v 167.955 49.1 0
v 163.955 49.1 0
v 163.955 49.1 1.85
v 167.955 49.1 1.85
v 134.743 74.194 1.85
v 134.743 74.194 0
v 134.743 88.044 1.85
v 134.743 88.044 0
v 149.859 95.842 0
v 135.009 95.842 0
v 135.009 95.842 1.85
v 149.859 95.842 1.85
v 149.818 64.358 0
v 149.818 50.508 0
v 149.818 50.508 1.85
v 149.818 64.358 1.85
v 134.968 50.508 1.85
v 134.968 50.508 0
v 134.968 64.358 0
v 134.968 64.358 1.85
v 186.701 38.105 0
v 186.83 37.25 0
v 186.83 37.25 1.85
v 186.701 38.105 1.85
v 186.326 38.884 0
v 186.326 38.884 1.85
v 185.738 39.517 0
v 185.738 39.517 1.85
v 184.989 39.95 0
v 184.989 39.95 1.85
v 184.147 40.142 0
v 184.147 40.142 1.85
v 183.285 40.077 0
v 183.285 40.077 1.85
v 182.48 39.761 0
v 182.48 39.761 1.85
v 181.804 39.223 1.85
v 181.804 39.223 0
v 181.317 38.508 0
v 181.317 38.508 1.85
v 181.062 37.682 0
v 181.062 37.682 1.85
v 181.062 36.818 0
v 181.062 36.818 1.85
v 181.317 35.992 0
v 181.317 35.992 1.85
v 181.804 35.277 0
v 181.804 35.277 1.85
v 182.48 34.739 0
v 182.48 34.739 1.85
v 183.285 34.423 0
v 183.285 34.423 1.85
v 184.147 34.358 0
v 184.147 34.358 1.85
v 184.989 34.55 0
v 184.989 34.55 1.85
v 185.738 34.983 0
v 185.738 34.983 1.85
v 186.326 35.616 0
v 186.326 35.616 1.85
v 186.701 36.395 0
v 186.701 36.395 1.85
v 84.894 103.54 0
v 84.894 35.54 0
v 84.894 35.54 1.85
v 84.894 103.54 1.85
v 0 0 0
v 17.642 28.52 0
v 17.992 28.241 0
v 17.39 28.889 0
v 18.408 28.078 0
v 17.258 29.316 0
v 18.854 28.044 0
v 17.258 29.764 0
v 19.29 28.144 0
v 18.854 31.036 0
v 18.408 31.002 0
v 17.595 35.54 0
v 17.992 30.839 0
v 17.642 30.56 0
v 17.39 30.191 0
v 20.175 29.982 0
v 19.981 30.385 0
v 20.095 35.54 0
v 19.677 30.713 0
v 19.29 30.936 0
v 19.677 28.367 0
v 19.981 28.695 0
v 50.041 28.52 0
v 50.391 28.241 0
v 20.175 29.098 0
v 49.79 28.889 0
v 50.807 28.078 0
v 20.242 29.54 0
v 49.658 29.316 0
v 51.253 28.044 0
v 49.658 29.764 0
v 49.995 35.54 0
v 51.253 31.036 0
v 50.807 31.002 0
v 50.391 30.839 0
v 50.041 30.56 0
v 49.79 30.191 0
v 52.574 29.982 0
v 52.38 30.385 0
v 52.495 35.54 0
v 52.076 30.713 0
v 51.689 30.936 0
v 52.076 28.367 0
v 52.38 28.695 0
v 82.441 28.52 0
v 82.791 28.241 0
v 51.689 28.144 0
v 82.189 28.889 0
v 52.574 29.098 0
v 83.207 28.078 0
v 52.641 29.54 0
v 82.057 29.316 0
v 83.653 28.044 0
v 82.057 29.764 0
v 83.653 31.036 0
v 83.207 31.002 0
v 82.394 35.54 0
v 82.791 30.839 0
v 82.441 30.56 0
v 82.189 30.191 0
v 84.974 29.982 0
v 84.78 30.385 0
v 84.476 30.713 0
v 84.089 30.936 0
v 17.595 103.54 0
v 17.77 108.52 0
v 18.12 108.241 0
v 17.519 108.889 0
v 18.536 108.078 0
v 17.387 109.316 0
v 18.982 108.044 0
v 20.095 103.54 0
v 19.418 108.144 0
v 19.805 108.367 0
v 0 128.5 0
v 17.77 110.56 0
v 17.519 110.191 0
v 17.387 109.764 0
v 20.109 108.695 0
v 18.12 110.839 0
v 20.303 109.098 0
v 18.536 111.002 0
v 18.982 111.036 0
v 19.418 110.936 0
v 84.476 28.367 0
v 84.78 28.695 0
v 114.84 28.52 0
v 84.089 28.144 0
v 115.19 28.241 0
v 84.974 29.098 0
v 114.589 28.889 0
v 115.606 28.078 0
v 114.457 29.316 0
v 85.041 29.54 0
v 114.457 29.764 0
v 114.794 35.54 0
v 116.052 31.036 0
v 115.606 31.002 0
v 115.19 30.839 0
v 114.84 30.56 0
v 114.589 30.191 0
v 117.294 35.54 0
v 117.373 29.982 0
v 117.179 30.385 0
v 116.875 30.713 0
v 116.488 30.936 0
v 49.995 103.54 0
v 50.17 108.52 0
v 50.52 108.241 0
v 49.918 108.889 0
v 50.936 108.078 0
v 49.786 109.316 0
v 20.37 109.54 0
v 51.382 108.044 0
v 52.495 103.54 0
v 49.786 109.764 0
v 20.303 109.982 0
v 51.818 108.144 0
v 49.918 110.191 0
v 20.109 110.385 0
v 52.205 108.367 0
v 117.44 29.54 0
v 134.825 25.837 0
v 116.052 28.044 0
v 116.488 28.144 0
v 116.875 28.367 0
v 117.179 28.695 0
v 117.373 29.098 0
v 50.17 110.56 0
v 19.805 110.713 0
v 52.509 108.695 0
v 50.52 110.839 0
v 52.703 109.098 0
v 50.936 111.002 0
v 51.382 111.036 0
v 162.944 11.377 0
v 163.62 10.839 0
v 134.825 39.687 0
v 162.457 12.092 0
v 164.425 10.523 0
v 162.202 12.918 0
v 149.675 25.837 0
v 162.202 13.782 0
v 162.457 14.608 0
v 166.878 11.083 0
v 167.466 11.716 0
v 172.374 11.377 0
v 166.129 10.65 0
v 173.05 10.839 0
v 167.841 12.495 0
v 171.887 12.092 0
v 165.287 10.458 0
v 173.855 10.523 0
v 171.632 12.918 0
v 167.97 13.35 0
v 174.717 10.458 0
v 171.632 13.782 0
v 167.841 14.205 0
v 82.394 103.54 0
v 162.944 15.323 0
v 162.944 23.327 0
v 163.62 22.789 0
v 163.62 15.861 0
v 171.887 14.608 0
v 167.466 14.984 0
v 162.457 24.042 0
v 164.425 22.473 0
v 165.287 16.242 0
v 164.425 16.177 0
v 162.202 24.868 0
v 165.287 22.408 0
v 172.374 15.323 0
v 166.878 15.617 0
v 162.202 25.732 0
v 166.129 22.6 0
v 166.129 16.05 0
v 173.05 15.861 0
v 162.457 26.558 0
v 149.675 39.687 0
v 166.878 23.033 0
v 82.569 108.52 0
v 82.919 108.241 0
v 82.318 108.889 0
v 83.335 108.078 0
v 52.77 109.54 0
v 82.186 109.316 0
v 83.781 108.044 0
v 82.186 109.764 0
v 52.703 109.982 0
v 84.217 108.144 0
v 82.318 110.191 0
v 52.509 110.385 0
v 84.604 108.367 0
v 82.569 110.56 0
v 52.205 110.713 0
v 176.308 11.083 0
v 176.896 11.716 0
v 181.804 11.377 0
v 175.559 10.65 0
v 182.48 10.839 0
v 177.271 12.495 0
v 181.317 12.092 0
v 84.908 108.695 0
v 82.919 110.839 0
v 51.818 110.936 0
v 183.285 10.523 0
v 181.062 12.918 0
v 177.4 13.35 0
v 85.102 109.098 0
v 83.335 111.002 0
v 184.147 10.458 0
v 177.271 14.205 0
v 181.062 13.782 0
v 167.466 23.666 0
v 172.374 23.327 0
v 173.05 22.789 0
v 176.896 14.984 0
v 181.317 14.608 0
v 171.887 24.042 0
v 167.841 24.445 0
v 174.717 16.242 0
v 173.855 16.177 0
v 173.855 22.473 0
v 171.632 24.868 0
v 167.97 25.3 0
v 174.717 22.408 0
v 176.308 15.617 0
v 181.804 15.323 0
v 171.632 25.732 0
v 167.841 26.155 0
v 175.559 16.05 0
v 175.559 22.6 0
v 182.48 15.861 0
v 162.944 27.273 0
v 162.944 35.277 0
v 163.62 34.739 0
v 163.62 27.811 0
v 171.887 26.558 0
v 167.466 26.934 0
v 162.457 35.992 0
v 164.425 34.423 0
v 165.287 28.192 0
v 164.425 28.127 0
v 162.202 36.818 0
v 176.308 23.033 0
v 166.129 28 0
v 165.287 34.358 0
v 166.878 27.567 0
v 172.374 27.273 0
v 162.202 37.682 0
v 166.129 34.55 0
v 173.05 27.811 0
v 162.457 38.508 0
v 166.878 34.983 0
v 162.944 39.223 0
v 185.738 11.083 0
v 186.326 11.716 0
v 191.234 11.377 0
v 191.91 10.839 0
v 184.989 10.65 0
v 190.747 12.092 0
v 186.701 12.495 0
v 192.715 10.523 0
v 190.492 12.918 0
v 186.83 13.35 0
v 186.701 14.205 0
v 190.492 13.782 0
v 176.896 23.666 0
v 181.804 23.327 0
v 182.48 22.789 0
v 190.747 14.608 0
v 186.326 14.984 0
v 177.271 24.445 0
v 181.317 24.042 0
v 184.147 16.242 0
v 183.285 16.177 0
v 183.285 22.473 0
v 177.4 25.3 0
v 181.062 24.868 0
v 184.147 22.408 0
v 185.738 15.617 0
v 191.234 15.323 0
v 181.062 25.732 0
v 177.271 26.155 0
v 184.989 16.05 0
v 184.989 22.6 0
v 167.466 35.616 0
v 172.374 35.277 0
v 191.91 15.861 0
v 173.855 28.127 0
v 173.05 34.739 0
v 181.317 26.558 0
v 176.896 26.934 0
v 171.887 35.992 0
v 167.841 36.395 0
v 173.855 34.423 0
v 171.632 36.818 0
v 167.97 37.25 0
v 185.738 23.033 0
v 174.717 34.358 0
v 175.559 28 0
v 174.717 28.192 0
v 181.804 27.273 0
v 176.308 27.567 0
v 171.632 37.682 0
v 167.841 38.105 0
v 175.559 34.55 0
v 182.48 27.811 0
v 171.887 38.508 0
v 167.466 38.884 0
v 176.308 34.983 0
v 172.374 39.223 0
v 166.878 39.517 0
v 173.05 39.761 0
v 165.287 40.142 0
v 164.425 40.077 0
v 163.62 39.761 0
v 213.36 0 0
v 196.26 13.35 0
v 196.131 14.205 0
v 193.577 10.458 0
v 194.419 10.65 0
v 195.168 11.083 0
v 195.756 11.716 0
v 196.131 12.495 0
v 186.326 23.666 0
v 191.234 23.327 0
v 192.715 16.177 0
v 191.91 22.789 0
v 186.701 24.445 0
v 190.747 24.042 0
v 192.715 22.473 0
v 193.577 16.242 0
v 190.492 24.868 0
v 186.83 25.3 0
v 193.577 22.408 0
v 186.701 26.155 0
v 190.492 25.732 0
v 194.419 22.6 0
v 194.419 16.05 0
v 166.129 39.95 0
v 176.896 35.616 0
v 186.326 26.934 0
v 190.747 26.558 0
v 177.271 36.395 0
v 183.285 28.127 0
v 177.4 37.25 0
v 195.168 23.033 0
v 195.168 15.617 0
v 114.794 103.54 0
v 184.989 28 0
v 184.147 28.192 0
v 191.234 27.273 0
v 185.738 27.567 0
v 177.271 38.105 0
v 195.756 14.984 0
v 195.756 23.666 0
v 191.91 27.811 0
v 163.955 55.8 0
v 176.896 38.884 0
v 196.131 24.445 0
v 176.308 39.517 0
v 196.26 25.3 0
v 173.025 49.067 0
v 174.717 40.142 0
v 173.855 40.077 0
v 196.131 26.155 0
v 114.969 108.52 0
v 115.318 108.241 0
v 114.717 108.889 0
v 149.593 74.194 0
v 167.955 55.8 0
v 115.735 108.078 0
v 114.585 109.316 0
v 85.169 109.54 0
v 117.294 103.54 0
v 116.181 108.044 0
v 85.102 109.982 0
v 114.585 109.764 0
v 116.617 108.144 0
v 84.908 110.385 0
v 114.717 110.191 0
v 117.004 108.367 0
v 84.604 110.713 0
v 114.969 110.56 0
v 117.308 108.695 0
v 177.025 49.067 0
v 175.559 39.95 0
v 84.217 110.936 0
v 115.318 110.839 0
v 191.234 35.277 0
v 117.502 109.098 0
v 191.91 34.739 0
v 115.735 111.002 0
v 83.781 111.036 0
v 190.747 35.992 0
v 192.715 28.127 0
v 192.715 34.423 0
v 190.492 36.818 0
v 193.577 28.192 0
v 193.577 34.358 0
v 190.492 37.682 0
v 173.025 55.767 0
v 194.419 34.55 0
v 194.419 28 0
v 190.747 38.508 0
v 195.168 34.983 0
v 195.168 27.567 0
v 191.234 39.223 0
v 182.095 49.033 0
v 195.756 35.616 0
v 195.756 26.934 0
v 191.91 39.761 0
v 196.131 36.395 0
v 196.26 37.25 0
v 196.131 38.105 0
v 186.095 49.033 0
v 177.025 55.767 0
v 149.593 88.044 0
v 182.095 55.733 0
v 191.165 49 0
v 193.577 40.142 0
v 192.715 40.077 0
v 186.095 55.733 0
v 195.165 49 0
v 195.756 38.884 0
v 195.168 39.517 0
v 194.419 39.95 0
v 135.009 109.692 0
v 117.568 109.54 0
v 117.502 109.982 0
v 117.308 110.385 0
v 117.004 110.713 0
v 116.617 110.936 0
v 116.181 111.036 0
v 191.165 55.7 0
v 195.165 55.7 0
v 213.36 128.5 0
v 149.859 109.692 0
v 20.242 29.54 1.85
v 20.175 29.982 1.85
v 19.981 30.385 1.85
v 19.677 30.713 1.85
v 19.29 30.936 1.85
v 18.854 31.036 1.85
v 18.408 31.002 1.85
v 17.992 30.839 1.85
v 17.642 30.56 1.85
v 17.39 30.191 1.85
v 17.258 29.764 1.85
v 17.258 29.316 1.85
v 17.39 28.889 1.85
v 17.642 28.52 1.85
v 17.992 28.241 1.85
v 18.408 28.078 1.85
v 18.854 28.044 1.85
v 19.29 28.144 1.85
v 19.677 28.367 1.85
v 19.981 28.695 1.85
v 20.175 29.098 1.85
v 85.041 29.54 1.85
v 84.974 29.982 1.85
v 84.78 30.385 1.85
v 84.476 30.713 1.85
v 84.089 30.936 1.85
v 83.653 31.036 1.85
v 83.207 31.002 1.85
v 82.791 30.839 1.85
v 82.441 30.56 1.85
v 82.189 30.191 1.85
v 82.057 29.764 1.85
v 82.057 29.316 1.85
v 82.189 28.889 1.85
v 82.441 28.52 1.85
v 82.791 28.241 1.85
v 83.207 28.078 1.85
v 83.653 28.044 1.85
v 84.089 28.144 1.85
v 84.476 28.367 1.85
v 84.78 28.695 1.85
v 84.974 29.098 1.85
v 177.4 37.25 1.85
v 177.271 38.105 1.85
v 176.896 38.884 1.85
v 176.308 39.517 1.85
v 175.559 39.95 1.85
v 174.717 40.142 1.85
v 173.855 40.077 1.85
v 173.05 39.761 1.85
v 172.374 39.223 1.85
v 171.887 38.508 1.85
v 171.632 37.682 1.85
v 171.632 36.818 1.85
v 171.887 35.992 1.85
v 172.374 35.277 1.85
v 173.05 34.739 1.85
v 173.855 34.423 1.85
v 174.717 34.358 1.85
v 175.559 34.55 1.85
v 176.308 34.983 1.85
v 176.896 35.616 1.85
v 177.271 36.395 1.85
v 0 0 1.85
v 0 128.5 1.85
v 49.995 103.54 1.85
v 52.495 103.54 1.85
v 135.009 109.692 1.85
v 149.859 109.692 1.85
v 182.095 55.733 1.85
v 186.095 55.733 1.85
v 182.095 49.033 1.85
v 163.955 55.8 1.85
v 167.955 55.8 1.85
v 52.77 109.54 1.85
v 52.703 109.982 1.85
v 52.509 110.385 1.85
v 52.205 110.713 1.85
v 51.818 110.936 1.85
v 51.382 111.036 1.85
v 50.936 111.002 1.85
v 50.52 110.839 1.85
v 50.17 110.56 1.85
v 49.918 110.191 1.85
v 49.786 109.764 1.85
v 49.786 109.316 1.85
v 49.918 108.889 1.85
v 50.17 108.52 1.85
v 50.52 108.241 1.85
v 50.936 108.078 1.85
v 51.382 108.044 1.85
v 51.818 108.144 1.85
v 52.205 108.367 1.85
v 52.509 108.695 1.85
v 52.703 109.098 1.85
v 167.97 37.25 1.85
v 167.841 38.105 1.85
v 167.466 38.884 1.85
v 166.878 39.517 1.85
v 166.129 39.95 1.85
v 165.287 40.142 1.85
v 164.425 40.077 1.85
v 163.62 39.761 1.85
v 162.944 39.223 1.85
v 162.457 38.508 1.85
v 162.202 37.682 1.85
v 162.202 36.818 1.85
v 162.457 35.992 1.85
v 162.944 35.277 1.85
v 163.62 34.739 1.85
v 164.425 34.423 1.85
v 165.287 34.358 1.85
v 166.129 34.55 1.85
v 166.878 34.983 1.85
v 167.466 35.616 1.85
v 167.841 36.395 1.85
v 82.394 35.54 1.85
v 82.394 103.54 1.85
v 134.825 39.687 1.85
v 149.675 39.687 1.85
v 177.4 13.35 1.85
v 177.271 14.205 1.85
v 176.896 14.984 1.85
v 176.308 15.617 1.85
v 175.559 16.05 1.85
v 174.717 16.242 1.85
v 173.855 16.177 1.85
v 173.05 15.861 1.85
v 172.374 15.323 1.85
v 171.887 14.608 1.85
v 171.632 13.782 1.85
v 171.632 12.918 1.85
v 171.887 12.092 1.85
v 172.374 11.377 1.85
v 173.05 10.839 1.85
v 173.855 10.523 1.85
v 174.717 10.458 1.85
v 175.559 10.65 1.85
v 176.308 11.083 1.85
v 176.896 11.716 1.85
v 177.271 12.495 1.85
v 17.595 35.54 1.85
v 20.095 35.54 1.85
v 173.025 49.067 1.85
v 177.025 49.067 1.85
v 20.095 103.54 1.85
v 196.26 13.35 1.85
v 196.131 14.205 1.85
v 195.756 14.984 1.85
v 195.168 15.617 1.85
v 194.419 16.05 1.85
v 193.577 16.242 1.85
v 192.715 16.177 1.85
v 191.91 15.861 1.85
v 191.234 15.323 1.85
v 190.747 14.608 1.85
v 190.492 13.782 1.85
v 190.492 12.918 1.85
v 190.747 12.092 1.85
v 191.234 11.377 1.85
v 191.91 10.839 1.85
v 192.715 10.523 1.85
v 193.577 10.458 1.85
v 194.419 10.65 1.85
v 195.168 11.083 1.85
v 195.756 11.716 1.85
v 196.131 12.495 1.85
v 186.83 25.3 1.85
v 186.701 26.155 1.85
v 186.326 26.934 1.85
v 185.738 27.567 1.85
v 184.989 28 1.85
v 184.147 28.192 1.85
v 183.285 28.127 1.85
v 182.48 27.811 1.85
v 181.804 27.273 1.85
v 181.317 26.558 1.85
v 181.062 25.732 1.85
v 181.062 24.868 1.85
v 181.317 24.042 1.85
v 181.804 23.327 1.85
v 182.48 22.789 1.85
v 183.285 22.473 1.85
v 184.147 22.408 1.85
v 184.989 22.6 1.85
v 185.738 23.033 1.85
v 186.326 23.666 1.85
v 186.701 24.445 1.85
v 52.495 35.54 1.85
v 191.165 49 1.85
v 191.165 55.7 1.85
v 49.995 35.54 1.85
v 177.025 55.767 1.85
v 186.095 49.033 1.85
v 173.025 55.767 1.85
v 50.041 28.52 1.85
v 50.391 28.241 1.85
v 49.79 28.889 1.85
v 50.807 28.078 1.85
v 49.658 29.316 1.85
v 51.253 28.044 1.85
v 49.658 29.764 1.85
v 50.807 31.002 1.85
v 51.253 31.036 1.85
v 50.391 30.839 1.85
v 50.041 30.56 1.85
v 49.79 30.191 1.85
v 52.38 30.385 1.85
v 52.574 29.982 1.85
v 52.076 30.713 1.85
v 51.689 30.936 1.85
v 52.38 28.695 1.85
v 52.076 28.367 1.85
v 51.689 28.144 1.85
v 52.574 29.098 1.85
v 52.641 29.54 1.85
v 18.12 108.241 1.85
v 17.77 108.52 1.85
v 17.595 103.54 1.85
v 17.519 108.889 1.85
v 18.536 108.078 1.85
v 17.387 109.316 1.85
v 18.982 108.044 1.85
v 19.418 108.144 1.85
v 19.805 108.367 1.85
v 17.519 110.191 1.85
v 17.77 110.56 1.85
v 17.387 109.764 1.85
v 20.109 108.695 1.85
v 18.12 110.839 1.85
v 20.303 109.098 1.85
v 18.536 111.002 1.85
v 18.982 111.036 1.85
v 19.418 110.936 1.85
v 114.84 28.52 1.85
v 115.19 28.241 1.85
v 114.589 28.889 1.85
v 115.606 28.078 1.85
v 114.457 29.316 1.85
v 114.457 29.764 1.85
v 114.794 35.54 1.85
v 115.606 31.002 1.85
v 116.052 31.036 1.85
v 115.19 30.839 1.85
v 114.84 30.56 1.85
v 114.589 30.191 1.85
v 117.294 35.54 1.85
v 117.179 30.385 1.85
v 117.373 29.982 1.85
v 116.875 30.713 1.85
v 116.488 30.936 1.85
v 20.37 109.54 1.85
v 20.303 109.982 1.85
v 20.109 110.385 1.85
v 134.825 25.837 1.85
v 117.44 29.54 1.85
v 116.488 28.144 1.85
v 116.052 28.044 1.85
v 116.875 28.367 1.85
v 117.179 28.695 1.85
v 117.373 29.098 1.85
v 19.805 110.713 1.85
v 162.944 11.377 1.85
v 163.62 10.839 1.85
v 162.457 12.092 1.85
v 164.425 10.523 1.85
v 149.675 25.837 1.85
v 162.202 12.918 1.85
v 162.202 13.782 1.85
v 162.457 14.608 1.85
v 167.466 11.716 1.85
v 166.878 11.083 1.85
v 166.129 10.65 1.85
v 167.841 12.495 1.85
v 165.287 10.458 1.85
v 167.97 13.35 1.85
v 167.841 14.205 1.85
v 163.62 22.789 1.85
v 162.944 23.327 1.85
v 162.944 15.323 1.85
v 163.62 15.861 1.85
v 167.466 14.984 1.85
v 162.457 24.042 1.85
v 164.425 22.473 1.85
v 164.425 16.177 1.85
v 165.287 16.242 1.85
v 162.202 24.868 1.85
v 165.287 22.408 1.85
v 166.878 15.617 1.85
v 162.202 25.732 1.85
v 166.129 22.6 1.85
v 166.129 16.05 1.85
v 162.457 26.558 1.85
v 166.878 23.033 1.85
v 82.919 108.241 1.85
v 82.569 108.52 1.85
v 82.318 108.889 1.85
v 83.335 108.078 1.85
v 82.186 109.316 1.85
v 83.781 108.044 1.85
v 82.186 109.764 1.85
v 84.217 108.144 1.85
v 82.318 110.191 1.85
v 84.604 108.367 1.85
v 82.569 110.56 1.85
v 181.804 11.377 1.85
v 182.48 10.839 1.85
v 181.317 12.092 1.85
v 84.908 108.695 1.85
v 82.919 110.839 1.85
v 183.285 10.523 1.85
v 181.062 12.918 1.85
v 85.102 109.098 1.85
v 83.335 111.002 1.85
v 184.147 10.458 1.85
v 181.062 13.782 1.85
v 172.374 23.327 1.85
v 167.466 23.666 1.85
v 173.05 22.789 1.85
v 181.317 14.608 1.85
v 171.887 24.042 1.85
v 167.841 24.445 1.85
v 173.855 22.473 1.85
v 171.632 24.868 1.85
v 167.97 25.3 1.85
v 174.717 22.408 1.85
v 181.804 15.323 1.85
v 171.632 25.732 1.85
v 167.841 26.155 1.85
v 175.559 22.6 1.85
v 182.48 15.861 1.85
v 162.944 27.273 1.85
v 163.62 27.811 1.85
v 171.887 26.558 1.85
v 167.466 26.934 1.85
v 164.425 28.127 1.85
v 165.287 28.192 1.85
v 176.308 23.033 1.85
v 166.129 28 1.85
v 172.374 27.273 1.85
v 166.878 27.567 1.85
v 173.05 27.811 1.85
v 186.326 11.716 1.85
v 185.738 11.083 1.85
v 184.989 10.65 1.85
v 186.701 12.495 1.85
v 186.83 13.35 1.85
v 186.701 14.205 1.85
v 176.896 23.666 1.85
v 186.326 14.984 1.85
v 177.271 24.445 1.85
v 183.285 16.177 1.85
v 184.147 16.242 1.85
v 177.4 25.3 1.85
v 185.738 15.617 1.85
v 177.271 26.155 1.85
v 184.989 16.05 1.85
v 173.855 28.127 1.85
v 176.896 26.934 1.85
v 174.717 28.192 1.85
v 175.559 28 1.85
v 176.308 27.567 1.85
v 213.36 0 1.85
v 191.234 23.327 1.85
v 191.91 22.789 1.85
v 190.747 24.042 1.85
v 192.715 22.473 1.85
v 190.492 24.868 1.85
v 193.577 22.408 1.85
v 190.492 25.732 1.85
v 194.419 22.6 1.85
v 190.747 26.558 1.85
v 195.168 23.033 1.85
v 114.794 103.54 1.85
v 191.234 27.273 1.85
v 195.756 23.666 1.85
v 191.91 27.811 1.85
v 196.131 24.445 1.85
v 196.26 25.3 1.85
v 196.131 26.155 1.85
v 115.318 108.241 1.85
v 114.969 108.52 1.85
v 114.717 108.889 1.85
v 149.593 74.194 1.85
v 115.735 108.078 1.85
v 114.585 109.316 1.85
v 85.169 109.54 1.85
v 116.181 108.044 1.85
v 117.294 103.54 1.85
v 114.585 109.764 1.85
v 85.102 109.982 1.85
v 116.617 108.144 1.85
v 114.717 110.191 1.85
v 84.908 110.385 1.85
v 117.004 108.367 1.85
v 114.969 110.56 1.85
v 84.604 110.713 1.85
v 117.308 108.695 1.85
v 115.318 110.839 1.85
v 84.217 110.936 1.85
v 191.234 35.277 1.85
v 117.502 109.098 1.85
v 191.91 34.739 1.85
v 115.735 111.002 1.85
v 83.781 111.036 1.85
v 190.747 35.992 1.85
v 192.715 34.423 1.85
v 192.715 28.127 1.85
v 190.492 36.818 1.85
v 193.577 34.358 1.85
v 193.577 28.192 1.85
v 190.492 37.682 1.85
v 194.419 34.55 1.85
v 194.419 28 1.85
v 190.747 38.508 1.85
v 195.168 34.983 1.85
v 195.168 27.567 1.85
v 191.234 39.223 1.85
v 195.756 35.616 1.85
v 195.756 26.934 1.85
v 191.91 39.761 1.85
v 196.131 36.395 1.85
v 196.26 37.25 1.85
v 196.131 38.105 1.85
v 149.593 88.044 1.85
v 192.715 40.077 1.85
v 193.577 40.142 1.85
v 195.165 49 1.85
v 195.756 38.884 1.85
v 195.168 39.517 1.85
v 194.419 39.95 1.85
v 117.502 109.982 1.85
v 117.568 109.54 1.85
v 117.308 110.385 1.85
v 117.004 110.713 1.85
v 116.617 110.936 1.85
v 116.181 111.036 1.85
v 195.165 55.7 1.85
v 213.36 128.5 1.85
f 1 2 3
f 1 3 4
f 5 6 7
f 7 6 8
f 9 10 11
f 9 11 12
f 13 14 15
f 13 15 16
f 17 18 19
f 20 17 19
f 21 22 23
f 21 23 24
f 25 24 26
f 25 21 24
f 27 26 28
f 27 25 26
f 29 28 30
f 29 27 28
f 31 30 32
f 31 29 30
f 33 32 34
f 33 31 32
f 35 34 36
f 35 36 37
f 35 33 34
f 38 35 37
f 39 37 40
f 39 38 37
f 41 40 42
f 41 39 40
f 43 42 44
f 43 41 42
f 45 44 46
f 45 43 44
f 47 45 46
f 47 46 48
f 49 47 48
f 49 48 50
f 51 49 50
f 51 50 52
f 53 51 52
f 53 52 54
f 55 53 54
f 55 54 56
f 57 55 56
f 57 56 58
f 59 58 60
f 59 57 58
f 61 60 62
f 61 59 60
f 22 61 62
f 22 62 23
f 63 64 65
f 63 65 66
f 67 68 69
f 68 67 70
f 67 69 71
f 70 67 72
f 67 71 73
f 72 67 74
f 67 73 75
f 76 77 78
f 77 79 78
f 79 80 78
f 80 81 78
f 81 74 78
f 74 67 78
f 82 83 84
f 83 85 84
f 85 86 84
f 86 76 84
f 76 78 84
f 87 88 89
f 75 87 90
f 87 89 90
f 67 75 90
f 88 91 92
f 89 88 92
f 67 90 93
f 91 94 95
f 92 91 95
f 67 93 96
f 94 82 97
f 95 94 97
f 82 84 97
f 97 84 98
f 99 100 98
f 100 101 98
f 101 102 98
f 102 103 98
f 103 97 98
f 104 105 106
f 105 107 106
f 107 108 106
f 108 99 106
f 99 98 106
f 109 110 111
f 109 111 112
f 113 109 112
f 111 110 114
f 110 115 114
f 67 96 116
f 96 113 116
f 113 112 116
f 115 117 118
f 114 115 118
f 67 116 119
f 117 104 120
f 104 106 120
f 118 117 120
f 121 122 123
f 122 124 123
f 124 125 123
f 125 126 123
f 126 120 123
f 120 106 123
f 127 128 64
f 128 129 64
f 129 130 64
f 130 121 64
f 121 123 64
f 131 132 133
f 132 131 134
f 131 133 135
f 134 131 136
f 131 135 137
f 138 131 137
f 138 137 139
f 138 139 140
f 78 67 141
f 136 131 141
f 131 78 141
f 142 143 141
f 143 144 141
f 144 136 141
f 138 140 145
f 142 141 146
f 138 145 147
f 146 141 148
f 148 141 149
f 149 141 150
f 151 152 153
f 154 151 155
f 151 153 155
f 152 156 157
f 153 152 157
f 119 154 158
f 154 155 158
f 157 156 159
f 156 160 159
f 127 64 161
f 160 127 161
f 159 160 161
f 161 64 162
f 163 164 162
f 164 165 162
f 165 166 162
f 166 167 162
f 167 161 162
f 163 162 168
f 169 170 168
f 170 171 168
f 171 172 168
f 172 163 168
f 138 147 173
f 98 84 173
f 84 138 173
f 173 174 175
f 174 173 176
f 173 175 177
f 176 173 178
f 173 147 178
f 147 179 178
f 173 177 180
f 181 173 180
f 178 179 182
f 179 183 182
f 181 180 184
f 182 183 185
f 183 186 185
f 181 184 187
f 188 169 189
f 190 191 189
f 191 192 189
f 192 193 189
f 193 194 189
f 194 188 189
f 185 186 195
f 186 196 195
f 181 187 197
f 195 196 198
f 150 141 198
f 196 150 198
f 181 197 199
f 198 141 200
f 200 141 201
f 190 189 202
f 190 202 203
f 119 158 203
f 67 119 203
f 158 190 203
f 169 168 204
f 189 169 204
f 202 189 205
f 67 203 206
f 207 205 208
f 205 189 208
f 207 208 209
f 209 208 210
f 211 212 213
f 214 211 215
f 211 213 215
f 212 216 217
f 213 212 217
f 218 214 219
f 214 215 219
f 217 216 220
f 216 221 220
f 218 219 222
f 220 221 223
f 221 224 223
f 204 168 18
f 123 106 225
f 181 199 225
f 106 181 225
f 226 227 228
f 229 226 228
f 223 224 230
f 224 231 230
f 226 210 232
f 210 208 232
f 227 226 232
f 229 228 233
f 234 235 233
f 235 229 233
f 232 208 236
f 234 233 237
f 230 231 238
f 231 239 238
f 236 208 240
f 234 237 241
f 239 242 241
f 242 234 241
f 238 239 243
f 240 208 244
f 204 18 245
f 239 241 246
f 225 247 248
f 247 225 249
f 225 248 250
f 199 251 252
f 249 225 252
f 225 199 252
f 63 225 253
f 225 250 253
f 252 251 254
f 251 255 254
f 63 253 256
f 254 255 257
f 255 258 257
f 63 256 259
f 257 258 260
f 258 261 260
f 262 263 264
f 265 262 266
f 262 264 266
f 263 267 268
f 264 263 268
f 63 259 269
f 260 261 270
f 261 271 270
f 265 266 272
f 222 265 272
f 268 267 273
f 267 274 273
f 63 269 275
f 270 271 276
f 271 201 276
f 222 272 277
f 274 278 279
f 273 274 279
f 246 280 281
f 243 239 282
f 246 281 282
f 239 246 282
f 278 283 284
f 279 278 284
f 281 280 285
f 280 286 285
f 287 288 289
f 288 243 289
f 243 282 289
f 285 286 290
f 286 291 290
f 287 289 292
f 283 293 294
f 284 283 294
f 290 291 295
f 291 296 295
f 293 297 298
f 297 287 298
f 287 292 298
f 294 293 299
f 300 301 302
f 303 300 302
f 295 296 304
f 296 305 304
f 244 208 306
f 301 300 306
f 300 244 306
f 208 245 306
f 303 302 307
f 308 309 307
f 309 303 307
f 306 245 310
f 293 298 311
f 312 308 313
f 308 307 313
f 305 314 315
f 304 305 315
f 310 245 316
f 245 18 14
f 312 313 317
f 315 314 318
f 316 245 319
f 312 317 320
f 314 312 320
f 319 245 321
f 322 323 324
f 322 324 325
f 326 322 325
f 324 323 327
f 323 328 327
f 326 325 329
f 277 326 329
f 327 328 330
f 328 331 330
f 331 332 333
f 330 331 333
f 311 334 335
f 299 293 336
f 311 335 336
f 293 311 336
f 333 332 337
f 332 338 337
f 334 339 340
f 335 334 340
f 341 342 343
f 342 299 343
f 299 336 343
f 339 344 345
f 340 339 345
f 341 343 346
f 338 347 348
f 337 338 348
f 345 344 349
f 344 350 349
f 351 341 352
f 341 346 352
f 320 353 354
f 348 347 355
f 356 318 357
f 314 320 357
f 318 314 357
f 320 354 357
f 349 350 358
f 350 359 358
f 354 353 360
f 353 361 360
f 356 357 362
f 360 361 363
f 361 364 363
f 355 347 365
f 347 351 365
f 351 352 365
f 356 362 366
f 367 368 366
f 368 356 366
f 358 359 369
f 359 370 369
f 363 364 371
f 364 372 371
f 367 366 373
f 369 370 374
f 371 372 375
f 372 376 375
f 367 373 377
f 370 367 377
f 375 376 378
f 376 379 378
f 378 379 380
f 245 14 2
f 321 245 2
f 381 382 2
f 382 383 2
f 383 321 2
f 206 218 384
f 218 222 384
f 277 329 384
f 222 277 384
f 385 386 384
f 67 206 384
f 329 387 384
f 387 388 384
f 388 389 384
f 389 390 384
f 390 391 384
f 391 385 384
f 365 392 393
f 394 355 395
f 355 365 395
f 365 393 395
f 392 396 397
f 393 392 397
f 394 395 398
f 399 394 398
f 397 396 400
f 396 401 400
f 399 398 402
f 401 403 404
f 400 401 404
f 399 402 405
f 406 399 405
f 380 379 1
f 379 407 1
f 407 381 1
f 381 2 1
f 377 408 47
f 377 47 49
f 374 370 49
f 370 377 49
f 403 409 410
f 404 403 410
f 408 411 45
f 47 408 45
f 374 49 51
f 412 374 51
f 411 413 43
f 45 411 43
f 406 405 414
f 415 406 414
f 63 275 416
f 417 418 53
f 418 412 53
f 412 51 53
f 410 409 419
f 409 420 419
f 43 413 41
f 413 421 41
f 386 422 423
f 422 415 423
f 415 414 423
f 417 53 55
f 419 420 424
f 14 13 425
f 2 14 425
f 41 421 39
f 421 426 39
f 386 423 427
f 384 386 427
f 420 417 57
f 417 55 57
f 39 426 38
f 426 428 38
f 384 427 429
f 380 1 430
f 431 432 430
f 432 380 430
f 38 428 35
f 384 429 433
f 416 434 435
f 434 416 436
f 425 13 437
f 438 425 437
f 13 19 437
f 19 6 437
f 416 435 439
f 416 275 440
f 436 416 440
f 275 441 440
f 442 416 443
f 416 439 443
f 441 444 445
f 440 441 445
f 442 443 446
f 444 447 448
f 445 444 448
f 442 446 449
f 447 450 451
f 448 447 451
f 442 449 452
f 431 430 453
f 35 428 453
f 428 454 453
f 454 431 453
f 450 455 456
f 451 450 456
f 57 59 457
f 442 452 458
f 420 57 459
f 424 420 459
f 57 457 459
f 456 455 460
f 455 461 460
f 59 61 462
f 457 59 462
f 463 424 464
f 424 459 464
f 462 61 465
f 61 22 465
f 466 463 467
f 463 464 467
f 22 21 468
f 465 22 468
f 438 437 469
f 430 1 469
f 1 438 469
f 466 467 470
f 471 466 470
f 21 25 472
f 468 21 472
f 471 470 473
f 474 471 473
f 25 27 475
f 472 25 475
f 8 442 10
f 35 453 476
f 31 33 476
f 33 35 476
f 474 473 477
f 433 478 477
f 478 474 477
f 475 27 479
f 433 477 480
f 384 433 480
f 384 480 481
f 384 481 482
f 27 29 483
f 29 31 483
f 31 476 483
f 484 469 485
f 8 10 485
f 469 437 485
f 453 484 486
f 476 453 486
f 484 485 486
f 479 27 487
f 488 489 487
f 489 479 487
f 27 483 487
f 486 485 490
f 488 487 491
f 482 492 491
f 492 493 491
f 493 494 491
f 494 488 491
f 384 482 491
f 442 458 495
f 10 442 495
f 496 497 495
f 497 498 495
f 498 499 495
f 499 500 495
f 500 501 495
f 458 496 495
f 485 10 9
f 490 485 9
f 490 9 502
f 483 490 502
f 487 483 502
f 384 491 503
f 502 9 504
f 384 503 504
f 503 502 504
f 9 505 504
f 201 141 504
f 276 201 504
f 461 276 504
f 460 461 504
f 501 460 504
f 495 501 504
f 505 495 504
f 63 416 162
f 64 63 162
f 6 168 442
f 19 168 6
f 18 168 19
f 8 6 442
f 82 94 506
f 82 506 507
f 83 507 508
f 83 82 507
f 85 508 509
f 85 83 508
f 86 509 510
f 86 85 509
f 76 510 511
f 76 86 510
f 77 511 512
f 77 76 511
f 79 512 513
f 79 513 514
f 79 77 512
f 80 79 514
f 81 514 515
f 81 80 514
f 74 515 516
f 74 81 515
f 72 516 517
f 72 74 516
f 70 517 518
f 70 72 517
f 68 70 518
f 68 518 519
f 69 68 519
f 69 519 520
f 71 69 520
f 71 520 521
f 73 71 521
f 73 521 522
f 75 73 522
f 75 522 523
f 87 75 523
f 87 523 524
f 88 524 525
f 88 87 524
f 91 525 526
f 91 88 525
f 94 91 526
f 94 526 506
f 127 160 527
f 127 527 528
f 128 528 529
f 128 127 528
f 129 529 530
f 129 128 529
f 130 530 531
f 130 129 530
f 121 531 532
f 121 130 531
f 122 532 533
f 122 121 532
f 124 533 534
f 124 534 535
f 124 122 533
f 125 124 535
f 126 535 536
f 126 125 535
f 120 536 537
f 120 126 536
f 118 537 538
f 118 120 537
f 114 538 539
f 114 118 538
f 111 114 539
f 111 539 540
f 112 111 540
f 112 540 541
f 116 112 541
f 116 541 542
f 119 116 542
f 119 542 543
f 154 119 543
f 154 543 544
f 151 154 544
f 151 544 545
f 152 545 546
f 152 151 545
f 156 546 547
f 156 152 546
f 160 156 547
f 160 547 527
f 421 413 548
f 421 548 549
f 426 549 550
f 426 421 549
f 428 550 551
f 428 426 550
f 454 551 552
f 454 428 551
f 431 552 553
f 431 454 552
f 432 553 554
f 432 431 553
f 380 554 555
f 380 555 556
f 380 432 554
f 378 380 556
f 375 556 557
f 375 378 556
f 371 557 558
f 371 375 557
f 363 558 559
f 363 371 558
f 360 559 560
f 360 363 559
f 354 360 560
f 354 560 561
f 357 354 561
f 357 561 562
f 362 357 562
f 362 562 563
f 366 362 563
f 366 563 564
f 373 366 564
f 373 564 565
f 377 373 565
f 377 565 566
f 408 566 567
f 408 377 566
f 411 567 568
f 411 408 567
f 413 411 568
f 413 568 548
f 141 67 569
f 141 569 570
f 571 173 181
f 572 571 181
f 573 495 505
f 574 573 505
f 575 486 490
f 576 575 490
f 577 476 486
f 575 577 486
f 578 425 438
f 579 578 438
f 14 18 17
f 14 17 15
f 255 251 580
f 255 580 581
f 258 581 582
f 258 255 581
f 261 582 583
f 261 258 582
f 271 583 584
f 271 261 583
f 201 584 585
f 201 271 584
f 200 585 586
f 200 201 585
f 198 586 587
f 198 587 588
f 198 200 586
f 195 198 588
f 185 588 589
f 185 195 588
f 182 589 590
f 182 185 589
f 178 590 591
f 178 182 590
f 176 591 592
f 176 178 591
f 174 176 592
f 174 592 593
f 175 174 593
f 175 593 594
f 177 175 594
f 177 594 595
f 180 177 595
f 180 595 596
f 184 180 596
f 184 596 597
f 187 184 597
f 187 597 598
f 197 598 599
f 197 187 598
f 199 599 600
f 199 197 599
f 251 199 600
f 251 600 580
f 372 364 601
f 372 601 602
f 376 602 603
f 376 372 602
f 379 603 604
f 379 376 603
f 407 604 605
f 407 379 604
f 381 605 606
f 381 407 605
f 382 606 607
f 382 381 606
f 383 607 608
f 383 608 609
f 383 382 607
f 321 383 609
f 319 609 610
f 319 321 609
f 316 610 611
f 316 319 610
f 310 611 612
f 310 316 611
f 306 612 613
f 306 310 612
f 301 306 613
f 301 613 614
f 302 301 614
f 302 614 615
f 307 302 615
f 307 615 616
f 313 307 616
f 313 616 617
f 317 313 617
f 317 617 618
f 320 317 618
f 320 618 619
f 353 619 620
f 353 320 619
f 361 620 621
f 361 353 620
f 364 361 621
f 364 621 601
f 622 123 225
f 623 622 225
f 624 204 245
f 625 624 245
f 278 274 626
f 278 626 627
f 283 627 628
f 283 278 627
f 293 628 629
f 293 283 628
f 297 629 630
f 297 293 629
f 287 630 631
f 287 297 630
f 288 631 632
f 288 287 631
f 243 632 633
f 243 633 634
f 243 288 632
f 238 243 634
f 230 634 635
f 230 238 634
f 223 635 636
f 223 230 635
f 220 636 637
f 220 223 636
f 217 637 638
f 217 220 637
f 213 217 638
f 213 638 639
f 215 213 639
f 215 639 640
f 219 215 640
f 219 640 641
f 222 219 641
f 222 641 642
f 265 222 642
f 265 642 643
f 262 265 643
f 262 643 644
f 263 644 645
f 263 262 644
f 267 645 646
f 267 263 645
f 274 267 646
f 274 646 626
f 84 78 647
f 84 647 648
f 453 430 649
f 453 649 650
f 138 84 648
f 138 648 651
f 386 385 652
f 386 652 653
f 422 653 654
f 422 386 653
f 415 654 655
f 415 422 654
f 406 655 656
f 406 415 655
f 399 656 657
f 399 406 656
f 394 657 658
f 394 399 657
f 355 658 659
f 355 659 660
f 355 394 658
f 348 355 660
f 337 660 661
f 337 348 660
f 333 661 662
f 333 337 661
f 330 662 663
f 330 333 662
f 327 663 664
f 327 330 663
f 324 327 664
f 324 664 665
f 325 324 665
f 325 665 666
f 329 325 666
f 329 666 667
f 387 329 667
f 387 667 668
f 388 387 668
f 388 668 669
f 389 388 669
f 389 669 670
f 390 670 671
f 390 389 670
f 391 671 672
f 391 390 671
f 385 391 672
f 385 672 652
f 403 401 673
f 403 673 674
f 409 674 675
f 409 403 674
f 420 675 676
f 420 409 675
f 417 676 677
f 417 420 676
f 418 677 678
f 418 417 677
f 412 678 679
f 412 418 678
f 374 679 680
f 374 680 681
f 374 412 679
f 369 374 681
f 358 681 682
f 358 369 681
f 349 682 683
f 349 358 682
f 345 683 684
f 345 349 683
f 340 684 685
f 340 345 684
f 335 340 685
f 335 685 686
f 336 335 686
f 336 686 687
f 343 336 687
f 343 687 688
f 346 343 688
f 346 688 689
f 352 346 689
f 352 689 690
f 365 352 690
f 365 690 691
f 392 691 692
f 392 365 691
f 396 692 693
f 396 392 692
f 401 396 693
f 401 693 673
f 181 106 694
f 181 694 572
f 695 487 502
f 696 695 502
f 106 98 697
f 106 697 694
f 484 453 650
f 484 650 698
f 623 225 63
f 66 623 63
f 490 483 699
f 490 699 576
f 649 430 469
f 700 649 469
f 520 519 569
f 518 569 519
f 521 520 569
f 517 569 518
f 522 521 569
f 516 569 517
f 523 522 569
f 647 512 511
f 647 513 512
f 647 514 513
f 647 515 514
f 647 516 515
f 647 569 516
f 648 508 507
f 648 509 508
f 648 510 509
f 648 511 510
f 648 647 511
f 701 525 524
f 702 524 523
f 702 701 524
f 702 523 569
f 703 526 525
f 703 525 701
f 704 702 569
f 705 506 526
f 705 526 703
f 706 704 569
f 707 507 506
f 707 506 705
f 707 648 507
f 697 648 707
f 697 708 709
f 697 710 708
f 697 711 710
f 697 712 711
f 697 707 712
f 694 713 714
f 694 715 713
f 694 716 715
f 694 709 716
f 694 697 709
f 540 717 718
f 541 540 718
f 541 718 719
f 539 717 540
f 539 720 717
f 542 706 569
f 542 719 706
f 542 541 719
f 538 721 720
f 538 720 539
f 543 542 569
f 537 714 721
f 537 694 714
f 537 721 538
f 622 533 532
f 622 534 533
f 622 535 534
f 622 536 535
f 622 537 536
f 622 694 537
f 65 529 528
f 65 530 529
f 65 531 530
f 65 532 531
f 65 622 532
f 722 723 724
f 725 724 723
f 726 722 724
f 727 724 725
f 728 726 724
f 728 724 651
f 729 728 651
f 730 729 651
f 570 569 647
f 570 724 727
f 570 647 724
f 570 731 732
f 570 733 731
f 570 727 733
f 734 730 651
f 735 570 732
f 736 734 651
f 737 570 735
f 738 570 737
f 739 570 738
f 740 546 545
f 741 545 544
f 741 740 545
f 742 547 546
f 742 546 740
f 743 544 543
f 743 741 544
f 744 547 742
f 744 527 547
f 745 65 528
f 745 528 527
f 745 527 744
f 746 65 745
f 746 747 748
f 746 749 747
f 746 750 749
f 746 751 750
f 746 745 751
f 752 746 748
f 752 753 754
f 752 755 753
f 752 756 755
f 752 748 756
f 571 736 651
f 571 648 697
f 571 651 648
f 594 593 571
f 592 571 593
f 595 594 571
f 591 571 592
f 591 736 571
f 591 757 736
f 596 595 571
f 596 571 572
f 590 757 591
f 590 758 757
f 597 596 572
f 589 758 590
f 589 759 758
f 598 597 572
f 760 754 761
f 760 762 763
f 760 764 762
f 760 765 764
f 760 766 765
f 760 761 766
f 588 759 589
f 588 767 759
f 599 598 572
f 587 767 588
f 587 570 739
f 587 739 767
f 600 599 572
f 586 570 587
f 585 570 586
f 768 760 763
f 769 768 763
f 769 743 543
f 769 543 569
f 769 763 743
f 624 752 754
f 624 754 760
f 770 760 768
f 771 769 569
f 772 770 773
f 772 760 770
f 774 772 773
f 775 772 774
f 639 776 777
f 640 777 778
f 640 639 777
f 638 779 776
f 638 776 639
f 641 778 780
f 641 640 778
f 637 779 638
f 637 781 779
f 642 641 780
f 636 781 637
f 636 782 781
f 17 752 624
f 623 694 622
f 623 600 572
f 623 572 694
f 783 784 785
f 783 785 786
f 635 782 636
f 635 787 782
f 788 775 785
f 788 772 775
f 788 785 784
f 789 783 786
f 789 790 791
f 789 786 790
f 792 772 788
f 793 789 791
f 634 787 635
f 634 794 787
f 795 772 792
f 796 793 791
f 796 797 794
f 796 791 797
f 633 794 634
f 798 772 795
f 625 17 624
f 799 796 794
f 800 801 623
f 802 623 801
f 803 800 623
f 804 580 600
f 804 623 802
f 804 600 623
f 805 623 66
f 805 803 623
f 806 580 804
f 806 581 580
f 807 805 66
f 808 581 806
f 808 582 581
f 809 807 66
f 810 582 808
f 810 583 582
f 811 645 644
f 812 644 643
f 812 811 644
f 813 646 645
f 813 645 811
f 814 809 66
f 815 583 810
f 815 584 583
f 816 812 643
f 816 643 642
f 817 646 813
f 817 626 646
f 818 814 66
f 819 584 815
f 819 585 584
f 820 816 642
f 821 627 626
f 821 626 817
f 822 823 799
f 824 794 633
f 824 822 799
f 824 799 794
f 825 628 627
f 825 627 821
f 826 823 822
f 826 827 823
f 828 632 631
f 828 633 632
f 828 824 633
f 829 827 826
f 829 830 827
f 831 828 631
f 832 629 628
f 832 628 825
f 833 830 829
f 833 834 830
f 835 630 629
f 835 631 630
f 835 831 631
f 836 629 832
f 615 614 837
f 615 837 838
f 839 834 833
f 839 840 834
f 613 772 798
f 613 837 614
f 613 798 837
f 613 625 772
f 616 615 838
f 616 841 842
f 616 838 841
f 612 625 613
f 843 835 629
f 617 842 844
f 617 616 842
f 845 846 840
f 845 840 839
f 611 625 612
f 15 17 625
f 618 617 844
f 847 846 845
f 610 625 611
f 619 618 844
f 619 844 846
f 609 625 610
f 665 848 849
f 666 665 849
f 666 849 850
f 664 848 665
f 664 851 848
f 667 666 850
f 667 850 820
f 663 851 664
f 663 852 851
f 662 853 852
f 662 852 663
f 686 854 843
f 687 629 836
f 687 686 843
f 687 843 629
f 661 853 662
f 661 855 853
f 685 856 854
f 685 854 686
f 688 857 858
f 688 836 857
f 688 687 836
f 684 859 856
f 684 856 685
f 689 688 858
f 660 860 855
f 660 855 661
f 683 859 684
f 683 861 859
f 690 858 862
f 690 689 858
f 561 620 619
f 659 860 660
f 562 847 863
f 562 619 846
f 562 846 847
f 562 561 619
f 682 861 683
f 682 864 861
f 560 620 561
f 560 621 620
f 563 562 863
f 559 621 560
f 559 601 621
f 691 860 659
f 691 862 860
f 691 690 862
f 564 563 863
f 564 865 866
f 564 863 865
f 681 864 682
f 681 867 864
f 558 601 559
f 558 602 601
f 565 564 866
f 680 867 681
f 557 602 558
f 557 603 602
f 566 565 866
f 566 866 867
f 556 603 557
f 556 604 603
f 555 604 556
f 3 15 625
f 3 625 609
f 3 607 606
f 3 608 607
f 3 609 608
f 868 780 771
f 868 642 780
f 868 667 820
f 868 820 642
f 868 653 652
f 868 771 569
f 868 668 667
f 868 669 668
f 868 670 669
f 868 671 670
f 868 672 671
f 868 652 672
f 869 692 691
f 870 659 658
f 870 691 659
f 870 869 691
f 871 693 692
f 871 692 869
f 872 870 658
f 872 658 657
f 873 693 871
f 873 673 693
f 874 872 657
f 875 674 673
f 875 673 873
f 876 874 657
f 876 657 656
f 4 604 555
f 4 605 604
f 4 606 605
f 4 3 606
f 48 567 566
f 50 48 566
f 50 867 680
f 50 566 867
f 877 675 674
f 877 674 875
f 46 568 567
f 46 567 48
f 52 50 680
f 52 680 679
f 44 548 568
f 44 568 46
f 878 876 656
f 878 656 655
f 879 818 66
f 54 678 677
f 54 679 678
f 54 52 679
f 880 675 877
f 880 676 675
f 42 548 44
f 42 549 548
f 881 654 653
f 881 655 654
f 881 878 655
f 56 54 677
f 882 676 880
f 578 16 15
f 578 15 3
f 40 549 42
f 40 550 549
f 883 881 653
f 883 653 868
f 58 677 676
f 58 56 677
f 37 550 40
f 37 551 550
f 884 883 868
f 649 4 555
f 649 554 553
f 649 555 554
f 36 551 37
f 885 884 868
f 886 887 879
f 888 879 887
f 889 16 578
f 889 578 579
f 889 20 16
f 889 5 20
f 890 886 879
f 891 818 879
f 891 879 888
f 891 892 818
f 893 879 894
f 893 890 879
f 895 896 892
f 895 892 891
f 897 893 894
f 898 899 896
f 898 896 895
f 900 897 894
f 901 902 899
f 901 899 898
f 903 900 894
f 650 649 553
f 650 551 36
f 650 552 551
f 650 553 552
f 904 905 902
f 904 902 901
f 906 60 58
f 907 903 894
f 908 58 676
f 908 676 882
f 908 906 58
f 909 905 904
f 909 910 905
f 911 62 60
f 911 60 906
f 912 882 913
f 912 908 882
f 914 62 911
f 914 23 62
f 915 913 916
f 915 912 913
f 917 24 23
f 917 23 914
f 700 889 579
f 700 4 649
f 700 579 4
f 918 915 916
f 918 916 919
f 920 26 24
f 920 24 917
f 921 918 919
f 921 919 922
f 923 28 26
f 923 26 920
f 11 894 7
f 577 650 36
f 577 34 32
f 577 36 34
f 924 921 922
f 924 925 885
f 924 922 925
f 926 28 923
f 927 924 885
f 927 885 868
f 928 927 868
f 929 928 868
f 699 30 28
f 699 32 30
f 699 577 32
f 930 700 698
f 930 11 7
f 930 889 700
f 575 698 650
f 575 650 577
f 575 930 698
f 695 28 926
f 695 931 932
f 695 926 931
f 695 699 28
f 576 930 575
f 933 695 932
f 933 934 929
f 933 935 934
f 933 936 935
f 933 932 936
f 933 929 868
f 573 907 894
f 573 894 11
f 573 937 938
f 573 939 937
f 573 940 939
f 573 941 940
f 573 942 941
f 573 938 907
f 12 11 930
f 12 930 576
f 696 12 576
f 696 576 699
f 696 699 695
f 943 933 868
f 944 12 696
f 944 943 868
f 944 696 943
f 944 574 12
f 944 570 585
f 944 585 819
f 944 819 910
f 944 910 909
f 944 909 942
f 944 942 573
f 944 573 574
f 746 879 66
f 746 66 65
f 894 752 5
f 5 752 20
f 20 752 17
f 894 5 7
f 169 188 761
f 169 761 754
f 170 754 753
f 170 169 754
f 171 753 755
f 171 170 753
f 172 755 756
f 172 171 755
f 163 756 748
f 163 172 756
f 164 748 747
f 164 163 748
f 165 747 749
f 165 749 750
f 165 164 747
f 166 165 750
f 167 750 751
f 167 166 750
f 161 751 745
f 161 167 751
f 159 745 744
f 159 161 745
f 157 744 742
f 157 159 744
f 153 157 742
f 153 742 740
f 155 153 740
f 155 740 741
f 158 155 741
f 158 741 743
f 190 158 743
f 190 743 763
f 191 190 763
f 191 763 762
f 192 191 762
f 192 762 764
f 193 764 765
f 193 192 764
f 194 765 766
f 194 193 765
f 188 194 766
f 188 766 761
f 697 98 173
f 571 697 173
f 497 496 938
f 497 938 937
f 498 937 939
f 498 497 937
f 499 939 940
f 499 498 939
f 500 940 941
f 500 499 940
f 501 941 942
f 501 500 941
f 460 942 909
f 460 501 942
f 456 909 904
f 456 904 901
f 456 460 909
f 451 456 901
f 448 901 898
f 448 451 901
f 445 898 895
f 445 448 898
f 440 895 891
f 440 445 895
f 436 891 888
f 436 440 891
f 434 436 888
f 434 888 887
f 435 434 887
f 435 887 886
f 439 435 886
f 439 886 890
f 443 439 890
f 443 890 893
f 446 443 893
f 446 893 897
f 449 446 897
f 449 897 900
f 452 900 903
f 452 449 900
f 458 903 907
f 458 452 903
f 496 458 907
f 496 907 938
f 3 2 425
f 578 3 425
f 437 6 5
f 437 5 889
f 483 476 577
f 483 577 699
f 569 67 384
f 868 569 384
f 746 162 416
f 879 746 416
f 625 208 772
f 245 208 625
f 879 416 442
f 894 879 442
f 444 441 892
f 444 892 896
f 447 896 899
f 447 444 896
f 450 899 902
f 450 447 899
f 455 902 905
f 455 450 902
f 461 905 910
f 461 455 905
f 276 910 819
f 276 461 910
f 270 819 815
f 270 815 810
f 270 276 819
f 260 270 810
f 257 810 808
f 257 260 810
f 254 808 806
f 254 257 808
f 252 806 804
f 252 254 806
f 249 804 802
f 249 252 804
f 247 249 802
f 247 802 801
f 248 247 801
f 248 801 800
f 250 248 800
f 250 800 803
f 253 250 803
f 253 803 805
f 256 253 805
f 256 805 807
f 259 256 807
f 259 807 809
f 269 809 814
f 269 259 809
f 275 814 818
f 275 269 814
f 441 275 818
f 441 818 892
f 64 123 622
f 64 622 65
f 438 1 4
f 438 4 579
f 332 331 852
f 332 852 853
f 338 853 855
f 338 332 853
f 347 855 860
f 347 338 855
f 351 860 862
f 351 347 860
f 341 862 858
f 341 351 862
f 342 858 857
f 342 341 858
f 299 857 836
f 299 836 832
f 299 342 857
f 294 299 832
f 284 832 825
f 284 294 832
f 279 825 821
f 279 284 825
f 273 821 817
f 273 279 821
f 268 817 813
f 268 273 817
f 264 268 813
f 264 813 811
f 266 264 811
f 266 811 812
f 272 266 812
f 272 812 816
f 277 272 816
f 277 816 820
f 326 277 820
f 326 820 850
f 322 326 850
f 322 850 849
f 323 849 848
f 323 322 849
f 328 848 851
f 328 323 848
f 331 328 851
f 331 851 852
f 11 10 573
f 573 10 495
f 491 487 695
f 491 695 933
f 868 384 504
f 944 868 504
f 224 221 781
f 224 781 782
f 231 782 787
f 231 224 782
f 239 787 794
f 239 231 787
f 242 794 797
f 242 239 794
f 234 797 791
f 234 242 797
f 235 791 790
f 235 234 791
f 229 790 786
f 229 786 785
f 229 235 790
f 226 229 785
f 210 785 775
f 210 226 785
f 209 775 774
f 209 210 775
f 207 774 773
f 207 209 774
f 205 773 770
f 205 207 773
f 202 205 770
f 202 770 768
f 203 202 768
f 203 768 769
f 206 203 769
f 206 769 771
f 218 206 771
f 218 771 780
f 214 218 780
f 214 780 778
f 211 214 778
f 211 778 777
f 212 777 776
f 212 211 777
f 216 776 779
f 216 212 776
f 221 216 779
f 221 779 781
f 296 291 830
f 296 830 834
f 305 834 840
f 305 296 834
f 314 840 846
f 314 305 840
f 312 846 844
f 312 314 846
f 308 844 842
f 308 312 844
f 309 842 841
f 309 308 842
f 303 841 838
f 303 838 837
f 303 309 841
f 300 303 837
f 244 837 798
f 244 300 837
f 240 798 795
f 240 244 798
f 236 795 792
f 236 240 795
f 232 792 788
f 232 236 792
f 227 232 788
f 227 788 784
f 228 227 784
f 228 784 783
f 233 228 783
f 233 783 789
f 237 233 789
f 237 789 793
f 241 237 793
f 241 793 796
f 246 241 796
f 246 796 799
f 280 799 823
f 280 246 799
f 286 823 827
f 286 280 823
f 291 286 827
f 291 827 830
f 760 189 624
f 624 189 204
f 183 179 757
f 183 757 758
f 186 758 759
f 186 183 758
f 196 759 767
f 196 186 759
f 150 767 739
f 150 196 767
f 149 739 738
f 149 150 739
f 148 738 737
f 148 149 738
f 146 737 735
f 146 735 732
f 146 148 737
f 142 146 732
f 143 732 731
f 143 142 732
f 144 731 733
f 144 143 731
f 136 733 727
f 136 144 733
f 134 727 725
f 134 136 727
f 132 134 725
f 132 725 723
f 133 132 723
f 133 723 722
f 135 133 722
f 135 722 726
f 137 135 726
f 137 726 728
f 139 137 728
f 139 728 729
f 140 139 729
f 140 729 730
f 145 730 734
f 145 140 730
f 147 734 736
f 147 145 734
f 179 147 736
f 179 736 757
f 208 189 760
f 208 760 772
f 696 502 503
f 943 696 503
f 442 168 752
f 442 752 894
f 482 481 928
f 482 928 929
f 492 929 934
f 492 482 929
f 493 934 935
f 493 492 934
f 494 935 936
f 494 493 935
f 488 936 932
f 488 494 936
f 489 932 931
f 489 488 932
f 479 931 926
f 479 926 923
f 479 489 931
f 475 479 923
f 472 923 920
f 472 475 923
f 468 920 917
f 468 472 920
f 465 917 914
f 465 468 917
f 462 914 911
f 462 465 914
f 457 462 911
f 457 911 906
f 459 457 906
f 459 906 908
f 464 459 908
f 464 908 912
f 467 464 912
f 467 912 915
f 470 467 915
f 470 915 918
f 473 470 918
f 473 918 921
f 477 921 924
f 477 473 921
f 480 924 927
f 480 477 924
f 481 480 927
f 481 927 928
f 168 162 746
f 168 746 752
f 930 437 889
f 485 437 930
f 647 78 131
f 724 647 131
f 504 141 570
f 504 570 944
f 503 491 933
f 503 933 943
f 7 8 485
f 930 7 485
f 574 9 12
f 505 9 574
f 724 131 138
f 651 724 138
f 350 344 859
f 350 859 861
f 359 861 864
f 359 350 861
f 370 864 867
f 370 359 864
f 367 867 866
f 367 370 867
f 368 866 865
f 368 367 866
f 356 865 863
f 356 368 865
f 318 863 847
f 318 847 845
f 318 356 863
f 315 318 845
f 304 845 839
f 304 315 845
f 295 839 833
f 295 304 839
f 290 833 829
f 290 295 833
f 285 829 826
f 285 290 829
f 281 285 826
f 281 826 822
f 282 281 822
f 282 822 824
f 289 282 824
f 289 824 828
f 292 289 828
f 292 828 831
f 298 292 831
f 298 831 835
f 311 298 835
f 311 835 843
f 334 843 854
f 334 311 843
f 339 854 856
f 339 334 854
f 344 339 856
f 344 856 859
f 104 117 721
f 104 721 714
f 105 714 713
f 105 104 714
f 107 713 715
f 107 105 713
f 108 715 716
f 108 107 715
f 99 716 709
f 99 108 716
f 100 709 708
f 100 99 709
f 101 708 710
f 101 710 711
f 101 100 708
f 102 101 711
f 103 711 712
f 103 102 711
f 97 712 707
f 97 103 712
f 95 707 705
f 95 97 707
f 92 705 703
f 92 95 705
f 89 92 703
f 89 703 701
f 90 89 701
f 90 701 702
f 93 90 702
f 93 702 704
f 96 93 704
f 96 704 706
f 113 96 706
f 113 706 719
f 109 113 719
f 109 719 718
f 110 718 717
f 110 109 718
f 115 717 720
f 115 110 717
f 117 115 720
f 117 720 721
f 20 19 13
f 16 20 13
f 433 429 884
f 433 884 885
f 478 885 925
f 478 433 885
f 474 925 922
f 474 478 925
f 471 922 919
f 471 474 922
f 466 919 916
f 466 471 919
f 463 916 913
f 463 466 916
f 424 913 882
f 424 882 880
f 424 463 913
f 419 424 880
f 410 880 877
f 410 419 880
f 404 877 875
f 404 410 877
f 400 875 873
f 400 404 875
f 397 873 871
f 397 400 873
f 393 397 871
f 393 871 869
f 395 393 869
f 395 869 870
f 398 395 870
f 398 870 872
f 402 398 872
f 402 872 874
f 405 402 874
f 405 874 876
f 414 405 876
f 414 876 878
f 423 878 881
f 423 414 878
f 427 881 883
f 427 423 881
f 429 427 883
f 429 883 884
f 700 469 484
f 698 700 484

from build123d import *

# Parameters (mm, degrees)
SKETCH_W   = 213.36
SKETCH_H   = 128.5
SKETCH_R   = 1.5
SKETCH_R_2 = 2.9
SKETCH_W_2 = 2.5
SKETCH_H_2 = 68
SKETCH_W_3 = 4
SKETCH_H_3 = 6.7
SKETCH_W_4 = 14.85
SKETCH_H_4 = 13.85
PAD_DEPTH  = 1.85


with BuildPart() as part:
    # Sketch → Pad (new body)
    with BuildSketch(Plane.XY):
        with Locations((106.68, 64.25)):
            Rectangle(SKETCH_W, SKETCH_H)
        with Locations((18.87, 109.54)):
            Circle(SKETCH_R, mode=Mode.SUBTRACT)
        with Locations((18.741513, 29.54)):
            Circle(SKETCH_R, mode=Mode.SUBTRACT)
        with Locations((51.141013, 29.54)):
            Circle(SKETCH_R, mode=Mode.SUBTRACT)
        with Locations((51.2695, 109.54)):
            Circle(SKETCH_R, mode=Mode.SUBTRACT)
        with Locations((83.540513, 29.54)):
            Circle(SKETCH_R, mode=Mode.SUBTRACT)
        with Locations((83.669, 109.54)):
            Circle(SKETCH_R, mode=Mode.SUBTRACT)
        with Locations((115.940013, 29.54)):
            Circle(SKETCH_R, mode=Mode.SUBTRACT)
        with Locations((116.0685, 109.54)):
            Circle(SKETCH_R, mode=Mode.SUBTRACT)
        with Locations((165.07, 37.25)):
            Circle(SKETCH_R_2, mode=Mode.SUBTRACT)
        with Locations((174.5, 37.25)):
            Circle(SKETCH_R_2, mode=Mode.SUBTRACT)
        with Locations((183.93, 37.25)):
            Circle(SKETCH_R_2, mode=Mode.SUBTRACT)
        with Locations((193.36, 37.25)):
            Circle(SKETCH_R_2, mode=Mode.SUBTRACT)
        with Locations((165.07, 25.3)):
            Circle(SKETCH_R_2, mode=Mode.SUBTRACT)
        with Locations((174.5, 25.3)):
            Circle(SKETCH_R_2, mode=Mode.SUBTRACT)
        with Locations((183.93, 25.3)):
            Circle(SKETCH_R_2, mode=Mode.SUBTRACT)
        with Locations((193.36, 25.3)):
            Circle(SKETCH_R_2, mode=Mode.SUBTRACT)
        with Locations((165.07, 13.35)):
            Circle(SKETCH_R_2, mode=Mode.SUBTRACT)
        with Locations((174.5, 13.35)):
            Circle(SKETCH_R_2, mode=Mode.SUBTRACT)
        with Locations((183.93, 13.35)):
            Circle(SKETCH_R_2, mode=Mode.SUBTRACT)
        with Locations((193.36, 13.35)):
            Circle(SKETCH_R_2, mode=Mode.SUBTRACT)
        with Locations((18.84522, 69.54)):
            Rectangle(SKETCH_W_2, SKETCH_H_2, mode=Mode.SUBTRACT)
        with Locations((51.24474, 69.54)):
            Rectangle(SKETCH_W_2, SKETCH_H_2, mode=Mode.SUBTRACT)
        with Locations((83.64426, 69.54)):
            Rectangle(SKETCH_W_2, SKETCH_H_2, mode=Mode.SUBTRACT)
        with Locations((116.04378, 69.54)):
            Rectangle(SKETCH_W_2, SKETCH_H_2, mode=Mode.SUBTRACT)
        with Locations((165.95529, 52.45)):
            Rectangle(SKETCH_W_3, SKETCH_H_3, mode=Mode.SUBTRACT)
        with Locations((175.025228, 52.416668)):
            Rectangle(SKETCH_W_3, SKETCH_H_3, mode=Mode.SUBTRACT)
        with Locations((184.095167, 52.383335)):
            Rectangle(SKETCH_W_3, SKETCH_H_3, mode=Mode.SUBTRACT)
        with Locations((193.165106, 52.350003)):
            Rectangle(SKETCH_W_3, SKETCH_H_3, mode=Mode.SUBTRACT)
        with Locations((142.433745, 102.767182)):
            Rectangle(SKETCH_W_4, SKETCH_H_4, mode=Mode.SUBTRACT)
        with Locations((142.16844, 81.118535)):
            Rectangle(SKETCH_W_4, SKETCH_H_4, mode=Mode.SUBTRACT)
        with Locations((142.250409, 32.762028)):
            Rectangle(SKETCH_W_4, SKETCH_H_4, mode=Mode.SUBTRACT)
        with Locations((142.392972, 57.432843)):
            Rectangle(SKETCH_W_4, SKETCH_H_4, mode=Mode.SUBTRACT)
    extrude(amount=PAD_DEPTH)


solid = part.part
